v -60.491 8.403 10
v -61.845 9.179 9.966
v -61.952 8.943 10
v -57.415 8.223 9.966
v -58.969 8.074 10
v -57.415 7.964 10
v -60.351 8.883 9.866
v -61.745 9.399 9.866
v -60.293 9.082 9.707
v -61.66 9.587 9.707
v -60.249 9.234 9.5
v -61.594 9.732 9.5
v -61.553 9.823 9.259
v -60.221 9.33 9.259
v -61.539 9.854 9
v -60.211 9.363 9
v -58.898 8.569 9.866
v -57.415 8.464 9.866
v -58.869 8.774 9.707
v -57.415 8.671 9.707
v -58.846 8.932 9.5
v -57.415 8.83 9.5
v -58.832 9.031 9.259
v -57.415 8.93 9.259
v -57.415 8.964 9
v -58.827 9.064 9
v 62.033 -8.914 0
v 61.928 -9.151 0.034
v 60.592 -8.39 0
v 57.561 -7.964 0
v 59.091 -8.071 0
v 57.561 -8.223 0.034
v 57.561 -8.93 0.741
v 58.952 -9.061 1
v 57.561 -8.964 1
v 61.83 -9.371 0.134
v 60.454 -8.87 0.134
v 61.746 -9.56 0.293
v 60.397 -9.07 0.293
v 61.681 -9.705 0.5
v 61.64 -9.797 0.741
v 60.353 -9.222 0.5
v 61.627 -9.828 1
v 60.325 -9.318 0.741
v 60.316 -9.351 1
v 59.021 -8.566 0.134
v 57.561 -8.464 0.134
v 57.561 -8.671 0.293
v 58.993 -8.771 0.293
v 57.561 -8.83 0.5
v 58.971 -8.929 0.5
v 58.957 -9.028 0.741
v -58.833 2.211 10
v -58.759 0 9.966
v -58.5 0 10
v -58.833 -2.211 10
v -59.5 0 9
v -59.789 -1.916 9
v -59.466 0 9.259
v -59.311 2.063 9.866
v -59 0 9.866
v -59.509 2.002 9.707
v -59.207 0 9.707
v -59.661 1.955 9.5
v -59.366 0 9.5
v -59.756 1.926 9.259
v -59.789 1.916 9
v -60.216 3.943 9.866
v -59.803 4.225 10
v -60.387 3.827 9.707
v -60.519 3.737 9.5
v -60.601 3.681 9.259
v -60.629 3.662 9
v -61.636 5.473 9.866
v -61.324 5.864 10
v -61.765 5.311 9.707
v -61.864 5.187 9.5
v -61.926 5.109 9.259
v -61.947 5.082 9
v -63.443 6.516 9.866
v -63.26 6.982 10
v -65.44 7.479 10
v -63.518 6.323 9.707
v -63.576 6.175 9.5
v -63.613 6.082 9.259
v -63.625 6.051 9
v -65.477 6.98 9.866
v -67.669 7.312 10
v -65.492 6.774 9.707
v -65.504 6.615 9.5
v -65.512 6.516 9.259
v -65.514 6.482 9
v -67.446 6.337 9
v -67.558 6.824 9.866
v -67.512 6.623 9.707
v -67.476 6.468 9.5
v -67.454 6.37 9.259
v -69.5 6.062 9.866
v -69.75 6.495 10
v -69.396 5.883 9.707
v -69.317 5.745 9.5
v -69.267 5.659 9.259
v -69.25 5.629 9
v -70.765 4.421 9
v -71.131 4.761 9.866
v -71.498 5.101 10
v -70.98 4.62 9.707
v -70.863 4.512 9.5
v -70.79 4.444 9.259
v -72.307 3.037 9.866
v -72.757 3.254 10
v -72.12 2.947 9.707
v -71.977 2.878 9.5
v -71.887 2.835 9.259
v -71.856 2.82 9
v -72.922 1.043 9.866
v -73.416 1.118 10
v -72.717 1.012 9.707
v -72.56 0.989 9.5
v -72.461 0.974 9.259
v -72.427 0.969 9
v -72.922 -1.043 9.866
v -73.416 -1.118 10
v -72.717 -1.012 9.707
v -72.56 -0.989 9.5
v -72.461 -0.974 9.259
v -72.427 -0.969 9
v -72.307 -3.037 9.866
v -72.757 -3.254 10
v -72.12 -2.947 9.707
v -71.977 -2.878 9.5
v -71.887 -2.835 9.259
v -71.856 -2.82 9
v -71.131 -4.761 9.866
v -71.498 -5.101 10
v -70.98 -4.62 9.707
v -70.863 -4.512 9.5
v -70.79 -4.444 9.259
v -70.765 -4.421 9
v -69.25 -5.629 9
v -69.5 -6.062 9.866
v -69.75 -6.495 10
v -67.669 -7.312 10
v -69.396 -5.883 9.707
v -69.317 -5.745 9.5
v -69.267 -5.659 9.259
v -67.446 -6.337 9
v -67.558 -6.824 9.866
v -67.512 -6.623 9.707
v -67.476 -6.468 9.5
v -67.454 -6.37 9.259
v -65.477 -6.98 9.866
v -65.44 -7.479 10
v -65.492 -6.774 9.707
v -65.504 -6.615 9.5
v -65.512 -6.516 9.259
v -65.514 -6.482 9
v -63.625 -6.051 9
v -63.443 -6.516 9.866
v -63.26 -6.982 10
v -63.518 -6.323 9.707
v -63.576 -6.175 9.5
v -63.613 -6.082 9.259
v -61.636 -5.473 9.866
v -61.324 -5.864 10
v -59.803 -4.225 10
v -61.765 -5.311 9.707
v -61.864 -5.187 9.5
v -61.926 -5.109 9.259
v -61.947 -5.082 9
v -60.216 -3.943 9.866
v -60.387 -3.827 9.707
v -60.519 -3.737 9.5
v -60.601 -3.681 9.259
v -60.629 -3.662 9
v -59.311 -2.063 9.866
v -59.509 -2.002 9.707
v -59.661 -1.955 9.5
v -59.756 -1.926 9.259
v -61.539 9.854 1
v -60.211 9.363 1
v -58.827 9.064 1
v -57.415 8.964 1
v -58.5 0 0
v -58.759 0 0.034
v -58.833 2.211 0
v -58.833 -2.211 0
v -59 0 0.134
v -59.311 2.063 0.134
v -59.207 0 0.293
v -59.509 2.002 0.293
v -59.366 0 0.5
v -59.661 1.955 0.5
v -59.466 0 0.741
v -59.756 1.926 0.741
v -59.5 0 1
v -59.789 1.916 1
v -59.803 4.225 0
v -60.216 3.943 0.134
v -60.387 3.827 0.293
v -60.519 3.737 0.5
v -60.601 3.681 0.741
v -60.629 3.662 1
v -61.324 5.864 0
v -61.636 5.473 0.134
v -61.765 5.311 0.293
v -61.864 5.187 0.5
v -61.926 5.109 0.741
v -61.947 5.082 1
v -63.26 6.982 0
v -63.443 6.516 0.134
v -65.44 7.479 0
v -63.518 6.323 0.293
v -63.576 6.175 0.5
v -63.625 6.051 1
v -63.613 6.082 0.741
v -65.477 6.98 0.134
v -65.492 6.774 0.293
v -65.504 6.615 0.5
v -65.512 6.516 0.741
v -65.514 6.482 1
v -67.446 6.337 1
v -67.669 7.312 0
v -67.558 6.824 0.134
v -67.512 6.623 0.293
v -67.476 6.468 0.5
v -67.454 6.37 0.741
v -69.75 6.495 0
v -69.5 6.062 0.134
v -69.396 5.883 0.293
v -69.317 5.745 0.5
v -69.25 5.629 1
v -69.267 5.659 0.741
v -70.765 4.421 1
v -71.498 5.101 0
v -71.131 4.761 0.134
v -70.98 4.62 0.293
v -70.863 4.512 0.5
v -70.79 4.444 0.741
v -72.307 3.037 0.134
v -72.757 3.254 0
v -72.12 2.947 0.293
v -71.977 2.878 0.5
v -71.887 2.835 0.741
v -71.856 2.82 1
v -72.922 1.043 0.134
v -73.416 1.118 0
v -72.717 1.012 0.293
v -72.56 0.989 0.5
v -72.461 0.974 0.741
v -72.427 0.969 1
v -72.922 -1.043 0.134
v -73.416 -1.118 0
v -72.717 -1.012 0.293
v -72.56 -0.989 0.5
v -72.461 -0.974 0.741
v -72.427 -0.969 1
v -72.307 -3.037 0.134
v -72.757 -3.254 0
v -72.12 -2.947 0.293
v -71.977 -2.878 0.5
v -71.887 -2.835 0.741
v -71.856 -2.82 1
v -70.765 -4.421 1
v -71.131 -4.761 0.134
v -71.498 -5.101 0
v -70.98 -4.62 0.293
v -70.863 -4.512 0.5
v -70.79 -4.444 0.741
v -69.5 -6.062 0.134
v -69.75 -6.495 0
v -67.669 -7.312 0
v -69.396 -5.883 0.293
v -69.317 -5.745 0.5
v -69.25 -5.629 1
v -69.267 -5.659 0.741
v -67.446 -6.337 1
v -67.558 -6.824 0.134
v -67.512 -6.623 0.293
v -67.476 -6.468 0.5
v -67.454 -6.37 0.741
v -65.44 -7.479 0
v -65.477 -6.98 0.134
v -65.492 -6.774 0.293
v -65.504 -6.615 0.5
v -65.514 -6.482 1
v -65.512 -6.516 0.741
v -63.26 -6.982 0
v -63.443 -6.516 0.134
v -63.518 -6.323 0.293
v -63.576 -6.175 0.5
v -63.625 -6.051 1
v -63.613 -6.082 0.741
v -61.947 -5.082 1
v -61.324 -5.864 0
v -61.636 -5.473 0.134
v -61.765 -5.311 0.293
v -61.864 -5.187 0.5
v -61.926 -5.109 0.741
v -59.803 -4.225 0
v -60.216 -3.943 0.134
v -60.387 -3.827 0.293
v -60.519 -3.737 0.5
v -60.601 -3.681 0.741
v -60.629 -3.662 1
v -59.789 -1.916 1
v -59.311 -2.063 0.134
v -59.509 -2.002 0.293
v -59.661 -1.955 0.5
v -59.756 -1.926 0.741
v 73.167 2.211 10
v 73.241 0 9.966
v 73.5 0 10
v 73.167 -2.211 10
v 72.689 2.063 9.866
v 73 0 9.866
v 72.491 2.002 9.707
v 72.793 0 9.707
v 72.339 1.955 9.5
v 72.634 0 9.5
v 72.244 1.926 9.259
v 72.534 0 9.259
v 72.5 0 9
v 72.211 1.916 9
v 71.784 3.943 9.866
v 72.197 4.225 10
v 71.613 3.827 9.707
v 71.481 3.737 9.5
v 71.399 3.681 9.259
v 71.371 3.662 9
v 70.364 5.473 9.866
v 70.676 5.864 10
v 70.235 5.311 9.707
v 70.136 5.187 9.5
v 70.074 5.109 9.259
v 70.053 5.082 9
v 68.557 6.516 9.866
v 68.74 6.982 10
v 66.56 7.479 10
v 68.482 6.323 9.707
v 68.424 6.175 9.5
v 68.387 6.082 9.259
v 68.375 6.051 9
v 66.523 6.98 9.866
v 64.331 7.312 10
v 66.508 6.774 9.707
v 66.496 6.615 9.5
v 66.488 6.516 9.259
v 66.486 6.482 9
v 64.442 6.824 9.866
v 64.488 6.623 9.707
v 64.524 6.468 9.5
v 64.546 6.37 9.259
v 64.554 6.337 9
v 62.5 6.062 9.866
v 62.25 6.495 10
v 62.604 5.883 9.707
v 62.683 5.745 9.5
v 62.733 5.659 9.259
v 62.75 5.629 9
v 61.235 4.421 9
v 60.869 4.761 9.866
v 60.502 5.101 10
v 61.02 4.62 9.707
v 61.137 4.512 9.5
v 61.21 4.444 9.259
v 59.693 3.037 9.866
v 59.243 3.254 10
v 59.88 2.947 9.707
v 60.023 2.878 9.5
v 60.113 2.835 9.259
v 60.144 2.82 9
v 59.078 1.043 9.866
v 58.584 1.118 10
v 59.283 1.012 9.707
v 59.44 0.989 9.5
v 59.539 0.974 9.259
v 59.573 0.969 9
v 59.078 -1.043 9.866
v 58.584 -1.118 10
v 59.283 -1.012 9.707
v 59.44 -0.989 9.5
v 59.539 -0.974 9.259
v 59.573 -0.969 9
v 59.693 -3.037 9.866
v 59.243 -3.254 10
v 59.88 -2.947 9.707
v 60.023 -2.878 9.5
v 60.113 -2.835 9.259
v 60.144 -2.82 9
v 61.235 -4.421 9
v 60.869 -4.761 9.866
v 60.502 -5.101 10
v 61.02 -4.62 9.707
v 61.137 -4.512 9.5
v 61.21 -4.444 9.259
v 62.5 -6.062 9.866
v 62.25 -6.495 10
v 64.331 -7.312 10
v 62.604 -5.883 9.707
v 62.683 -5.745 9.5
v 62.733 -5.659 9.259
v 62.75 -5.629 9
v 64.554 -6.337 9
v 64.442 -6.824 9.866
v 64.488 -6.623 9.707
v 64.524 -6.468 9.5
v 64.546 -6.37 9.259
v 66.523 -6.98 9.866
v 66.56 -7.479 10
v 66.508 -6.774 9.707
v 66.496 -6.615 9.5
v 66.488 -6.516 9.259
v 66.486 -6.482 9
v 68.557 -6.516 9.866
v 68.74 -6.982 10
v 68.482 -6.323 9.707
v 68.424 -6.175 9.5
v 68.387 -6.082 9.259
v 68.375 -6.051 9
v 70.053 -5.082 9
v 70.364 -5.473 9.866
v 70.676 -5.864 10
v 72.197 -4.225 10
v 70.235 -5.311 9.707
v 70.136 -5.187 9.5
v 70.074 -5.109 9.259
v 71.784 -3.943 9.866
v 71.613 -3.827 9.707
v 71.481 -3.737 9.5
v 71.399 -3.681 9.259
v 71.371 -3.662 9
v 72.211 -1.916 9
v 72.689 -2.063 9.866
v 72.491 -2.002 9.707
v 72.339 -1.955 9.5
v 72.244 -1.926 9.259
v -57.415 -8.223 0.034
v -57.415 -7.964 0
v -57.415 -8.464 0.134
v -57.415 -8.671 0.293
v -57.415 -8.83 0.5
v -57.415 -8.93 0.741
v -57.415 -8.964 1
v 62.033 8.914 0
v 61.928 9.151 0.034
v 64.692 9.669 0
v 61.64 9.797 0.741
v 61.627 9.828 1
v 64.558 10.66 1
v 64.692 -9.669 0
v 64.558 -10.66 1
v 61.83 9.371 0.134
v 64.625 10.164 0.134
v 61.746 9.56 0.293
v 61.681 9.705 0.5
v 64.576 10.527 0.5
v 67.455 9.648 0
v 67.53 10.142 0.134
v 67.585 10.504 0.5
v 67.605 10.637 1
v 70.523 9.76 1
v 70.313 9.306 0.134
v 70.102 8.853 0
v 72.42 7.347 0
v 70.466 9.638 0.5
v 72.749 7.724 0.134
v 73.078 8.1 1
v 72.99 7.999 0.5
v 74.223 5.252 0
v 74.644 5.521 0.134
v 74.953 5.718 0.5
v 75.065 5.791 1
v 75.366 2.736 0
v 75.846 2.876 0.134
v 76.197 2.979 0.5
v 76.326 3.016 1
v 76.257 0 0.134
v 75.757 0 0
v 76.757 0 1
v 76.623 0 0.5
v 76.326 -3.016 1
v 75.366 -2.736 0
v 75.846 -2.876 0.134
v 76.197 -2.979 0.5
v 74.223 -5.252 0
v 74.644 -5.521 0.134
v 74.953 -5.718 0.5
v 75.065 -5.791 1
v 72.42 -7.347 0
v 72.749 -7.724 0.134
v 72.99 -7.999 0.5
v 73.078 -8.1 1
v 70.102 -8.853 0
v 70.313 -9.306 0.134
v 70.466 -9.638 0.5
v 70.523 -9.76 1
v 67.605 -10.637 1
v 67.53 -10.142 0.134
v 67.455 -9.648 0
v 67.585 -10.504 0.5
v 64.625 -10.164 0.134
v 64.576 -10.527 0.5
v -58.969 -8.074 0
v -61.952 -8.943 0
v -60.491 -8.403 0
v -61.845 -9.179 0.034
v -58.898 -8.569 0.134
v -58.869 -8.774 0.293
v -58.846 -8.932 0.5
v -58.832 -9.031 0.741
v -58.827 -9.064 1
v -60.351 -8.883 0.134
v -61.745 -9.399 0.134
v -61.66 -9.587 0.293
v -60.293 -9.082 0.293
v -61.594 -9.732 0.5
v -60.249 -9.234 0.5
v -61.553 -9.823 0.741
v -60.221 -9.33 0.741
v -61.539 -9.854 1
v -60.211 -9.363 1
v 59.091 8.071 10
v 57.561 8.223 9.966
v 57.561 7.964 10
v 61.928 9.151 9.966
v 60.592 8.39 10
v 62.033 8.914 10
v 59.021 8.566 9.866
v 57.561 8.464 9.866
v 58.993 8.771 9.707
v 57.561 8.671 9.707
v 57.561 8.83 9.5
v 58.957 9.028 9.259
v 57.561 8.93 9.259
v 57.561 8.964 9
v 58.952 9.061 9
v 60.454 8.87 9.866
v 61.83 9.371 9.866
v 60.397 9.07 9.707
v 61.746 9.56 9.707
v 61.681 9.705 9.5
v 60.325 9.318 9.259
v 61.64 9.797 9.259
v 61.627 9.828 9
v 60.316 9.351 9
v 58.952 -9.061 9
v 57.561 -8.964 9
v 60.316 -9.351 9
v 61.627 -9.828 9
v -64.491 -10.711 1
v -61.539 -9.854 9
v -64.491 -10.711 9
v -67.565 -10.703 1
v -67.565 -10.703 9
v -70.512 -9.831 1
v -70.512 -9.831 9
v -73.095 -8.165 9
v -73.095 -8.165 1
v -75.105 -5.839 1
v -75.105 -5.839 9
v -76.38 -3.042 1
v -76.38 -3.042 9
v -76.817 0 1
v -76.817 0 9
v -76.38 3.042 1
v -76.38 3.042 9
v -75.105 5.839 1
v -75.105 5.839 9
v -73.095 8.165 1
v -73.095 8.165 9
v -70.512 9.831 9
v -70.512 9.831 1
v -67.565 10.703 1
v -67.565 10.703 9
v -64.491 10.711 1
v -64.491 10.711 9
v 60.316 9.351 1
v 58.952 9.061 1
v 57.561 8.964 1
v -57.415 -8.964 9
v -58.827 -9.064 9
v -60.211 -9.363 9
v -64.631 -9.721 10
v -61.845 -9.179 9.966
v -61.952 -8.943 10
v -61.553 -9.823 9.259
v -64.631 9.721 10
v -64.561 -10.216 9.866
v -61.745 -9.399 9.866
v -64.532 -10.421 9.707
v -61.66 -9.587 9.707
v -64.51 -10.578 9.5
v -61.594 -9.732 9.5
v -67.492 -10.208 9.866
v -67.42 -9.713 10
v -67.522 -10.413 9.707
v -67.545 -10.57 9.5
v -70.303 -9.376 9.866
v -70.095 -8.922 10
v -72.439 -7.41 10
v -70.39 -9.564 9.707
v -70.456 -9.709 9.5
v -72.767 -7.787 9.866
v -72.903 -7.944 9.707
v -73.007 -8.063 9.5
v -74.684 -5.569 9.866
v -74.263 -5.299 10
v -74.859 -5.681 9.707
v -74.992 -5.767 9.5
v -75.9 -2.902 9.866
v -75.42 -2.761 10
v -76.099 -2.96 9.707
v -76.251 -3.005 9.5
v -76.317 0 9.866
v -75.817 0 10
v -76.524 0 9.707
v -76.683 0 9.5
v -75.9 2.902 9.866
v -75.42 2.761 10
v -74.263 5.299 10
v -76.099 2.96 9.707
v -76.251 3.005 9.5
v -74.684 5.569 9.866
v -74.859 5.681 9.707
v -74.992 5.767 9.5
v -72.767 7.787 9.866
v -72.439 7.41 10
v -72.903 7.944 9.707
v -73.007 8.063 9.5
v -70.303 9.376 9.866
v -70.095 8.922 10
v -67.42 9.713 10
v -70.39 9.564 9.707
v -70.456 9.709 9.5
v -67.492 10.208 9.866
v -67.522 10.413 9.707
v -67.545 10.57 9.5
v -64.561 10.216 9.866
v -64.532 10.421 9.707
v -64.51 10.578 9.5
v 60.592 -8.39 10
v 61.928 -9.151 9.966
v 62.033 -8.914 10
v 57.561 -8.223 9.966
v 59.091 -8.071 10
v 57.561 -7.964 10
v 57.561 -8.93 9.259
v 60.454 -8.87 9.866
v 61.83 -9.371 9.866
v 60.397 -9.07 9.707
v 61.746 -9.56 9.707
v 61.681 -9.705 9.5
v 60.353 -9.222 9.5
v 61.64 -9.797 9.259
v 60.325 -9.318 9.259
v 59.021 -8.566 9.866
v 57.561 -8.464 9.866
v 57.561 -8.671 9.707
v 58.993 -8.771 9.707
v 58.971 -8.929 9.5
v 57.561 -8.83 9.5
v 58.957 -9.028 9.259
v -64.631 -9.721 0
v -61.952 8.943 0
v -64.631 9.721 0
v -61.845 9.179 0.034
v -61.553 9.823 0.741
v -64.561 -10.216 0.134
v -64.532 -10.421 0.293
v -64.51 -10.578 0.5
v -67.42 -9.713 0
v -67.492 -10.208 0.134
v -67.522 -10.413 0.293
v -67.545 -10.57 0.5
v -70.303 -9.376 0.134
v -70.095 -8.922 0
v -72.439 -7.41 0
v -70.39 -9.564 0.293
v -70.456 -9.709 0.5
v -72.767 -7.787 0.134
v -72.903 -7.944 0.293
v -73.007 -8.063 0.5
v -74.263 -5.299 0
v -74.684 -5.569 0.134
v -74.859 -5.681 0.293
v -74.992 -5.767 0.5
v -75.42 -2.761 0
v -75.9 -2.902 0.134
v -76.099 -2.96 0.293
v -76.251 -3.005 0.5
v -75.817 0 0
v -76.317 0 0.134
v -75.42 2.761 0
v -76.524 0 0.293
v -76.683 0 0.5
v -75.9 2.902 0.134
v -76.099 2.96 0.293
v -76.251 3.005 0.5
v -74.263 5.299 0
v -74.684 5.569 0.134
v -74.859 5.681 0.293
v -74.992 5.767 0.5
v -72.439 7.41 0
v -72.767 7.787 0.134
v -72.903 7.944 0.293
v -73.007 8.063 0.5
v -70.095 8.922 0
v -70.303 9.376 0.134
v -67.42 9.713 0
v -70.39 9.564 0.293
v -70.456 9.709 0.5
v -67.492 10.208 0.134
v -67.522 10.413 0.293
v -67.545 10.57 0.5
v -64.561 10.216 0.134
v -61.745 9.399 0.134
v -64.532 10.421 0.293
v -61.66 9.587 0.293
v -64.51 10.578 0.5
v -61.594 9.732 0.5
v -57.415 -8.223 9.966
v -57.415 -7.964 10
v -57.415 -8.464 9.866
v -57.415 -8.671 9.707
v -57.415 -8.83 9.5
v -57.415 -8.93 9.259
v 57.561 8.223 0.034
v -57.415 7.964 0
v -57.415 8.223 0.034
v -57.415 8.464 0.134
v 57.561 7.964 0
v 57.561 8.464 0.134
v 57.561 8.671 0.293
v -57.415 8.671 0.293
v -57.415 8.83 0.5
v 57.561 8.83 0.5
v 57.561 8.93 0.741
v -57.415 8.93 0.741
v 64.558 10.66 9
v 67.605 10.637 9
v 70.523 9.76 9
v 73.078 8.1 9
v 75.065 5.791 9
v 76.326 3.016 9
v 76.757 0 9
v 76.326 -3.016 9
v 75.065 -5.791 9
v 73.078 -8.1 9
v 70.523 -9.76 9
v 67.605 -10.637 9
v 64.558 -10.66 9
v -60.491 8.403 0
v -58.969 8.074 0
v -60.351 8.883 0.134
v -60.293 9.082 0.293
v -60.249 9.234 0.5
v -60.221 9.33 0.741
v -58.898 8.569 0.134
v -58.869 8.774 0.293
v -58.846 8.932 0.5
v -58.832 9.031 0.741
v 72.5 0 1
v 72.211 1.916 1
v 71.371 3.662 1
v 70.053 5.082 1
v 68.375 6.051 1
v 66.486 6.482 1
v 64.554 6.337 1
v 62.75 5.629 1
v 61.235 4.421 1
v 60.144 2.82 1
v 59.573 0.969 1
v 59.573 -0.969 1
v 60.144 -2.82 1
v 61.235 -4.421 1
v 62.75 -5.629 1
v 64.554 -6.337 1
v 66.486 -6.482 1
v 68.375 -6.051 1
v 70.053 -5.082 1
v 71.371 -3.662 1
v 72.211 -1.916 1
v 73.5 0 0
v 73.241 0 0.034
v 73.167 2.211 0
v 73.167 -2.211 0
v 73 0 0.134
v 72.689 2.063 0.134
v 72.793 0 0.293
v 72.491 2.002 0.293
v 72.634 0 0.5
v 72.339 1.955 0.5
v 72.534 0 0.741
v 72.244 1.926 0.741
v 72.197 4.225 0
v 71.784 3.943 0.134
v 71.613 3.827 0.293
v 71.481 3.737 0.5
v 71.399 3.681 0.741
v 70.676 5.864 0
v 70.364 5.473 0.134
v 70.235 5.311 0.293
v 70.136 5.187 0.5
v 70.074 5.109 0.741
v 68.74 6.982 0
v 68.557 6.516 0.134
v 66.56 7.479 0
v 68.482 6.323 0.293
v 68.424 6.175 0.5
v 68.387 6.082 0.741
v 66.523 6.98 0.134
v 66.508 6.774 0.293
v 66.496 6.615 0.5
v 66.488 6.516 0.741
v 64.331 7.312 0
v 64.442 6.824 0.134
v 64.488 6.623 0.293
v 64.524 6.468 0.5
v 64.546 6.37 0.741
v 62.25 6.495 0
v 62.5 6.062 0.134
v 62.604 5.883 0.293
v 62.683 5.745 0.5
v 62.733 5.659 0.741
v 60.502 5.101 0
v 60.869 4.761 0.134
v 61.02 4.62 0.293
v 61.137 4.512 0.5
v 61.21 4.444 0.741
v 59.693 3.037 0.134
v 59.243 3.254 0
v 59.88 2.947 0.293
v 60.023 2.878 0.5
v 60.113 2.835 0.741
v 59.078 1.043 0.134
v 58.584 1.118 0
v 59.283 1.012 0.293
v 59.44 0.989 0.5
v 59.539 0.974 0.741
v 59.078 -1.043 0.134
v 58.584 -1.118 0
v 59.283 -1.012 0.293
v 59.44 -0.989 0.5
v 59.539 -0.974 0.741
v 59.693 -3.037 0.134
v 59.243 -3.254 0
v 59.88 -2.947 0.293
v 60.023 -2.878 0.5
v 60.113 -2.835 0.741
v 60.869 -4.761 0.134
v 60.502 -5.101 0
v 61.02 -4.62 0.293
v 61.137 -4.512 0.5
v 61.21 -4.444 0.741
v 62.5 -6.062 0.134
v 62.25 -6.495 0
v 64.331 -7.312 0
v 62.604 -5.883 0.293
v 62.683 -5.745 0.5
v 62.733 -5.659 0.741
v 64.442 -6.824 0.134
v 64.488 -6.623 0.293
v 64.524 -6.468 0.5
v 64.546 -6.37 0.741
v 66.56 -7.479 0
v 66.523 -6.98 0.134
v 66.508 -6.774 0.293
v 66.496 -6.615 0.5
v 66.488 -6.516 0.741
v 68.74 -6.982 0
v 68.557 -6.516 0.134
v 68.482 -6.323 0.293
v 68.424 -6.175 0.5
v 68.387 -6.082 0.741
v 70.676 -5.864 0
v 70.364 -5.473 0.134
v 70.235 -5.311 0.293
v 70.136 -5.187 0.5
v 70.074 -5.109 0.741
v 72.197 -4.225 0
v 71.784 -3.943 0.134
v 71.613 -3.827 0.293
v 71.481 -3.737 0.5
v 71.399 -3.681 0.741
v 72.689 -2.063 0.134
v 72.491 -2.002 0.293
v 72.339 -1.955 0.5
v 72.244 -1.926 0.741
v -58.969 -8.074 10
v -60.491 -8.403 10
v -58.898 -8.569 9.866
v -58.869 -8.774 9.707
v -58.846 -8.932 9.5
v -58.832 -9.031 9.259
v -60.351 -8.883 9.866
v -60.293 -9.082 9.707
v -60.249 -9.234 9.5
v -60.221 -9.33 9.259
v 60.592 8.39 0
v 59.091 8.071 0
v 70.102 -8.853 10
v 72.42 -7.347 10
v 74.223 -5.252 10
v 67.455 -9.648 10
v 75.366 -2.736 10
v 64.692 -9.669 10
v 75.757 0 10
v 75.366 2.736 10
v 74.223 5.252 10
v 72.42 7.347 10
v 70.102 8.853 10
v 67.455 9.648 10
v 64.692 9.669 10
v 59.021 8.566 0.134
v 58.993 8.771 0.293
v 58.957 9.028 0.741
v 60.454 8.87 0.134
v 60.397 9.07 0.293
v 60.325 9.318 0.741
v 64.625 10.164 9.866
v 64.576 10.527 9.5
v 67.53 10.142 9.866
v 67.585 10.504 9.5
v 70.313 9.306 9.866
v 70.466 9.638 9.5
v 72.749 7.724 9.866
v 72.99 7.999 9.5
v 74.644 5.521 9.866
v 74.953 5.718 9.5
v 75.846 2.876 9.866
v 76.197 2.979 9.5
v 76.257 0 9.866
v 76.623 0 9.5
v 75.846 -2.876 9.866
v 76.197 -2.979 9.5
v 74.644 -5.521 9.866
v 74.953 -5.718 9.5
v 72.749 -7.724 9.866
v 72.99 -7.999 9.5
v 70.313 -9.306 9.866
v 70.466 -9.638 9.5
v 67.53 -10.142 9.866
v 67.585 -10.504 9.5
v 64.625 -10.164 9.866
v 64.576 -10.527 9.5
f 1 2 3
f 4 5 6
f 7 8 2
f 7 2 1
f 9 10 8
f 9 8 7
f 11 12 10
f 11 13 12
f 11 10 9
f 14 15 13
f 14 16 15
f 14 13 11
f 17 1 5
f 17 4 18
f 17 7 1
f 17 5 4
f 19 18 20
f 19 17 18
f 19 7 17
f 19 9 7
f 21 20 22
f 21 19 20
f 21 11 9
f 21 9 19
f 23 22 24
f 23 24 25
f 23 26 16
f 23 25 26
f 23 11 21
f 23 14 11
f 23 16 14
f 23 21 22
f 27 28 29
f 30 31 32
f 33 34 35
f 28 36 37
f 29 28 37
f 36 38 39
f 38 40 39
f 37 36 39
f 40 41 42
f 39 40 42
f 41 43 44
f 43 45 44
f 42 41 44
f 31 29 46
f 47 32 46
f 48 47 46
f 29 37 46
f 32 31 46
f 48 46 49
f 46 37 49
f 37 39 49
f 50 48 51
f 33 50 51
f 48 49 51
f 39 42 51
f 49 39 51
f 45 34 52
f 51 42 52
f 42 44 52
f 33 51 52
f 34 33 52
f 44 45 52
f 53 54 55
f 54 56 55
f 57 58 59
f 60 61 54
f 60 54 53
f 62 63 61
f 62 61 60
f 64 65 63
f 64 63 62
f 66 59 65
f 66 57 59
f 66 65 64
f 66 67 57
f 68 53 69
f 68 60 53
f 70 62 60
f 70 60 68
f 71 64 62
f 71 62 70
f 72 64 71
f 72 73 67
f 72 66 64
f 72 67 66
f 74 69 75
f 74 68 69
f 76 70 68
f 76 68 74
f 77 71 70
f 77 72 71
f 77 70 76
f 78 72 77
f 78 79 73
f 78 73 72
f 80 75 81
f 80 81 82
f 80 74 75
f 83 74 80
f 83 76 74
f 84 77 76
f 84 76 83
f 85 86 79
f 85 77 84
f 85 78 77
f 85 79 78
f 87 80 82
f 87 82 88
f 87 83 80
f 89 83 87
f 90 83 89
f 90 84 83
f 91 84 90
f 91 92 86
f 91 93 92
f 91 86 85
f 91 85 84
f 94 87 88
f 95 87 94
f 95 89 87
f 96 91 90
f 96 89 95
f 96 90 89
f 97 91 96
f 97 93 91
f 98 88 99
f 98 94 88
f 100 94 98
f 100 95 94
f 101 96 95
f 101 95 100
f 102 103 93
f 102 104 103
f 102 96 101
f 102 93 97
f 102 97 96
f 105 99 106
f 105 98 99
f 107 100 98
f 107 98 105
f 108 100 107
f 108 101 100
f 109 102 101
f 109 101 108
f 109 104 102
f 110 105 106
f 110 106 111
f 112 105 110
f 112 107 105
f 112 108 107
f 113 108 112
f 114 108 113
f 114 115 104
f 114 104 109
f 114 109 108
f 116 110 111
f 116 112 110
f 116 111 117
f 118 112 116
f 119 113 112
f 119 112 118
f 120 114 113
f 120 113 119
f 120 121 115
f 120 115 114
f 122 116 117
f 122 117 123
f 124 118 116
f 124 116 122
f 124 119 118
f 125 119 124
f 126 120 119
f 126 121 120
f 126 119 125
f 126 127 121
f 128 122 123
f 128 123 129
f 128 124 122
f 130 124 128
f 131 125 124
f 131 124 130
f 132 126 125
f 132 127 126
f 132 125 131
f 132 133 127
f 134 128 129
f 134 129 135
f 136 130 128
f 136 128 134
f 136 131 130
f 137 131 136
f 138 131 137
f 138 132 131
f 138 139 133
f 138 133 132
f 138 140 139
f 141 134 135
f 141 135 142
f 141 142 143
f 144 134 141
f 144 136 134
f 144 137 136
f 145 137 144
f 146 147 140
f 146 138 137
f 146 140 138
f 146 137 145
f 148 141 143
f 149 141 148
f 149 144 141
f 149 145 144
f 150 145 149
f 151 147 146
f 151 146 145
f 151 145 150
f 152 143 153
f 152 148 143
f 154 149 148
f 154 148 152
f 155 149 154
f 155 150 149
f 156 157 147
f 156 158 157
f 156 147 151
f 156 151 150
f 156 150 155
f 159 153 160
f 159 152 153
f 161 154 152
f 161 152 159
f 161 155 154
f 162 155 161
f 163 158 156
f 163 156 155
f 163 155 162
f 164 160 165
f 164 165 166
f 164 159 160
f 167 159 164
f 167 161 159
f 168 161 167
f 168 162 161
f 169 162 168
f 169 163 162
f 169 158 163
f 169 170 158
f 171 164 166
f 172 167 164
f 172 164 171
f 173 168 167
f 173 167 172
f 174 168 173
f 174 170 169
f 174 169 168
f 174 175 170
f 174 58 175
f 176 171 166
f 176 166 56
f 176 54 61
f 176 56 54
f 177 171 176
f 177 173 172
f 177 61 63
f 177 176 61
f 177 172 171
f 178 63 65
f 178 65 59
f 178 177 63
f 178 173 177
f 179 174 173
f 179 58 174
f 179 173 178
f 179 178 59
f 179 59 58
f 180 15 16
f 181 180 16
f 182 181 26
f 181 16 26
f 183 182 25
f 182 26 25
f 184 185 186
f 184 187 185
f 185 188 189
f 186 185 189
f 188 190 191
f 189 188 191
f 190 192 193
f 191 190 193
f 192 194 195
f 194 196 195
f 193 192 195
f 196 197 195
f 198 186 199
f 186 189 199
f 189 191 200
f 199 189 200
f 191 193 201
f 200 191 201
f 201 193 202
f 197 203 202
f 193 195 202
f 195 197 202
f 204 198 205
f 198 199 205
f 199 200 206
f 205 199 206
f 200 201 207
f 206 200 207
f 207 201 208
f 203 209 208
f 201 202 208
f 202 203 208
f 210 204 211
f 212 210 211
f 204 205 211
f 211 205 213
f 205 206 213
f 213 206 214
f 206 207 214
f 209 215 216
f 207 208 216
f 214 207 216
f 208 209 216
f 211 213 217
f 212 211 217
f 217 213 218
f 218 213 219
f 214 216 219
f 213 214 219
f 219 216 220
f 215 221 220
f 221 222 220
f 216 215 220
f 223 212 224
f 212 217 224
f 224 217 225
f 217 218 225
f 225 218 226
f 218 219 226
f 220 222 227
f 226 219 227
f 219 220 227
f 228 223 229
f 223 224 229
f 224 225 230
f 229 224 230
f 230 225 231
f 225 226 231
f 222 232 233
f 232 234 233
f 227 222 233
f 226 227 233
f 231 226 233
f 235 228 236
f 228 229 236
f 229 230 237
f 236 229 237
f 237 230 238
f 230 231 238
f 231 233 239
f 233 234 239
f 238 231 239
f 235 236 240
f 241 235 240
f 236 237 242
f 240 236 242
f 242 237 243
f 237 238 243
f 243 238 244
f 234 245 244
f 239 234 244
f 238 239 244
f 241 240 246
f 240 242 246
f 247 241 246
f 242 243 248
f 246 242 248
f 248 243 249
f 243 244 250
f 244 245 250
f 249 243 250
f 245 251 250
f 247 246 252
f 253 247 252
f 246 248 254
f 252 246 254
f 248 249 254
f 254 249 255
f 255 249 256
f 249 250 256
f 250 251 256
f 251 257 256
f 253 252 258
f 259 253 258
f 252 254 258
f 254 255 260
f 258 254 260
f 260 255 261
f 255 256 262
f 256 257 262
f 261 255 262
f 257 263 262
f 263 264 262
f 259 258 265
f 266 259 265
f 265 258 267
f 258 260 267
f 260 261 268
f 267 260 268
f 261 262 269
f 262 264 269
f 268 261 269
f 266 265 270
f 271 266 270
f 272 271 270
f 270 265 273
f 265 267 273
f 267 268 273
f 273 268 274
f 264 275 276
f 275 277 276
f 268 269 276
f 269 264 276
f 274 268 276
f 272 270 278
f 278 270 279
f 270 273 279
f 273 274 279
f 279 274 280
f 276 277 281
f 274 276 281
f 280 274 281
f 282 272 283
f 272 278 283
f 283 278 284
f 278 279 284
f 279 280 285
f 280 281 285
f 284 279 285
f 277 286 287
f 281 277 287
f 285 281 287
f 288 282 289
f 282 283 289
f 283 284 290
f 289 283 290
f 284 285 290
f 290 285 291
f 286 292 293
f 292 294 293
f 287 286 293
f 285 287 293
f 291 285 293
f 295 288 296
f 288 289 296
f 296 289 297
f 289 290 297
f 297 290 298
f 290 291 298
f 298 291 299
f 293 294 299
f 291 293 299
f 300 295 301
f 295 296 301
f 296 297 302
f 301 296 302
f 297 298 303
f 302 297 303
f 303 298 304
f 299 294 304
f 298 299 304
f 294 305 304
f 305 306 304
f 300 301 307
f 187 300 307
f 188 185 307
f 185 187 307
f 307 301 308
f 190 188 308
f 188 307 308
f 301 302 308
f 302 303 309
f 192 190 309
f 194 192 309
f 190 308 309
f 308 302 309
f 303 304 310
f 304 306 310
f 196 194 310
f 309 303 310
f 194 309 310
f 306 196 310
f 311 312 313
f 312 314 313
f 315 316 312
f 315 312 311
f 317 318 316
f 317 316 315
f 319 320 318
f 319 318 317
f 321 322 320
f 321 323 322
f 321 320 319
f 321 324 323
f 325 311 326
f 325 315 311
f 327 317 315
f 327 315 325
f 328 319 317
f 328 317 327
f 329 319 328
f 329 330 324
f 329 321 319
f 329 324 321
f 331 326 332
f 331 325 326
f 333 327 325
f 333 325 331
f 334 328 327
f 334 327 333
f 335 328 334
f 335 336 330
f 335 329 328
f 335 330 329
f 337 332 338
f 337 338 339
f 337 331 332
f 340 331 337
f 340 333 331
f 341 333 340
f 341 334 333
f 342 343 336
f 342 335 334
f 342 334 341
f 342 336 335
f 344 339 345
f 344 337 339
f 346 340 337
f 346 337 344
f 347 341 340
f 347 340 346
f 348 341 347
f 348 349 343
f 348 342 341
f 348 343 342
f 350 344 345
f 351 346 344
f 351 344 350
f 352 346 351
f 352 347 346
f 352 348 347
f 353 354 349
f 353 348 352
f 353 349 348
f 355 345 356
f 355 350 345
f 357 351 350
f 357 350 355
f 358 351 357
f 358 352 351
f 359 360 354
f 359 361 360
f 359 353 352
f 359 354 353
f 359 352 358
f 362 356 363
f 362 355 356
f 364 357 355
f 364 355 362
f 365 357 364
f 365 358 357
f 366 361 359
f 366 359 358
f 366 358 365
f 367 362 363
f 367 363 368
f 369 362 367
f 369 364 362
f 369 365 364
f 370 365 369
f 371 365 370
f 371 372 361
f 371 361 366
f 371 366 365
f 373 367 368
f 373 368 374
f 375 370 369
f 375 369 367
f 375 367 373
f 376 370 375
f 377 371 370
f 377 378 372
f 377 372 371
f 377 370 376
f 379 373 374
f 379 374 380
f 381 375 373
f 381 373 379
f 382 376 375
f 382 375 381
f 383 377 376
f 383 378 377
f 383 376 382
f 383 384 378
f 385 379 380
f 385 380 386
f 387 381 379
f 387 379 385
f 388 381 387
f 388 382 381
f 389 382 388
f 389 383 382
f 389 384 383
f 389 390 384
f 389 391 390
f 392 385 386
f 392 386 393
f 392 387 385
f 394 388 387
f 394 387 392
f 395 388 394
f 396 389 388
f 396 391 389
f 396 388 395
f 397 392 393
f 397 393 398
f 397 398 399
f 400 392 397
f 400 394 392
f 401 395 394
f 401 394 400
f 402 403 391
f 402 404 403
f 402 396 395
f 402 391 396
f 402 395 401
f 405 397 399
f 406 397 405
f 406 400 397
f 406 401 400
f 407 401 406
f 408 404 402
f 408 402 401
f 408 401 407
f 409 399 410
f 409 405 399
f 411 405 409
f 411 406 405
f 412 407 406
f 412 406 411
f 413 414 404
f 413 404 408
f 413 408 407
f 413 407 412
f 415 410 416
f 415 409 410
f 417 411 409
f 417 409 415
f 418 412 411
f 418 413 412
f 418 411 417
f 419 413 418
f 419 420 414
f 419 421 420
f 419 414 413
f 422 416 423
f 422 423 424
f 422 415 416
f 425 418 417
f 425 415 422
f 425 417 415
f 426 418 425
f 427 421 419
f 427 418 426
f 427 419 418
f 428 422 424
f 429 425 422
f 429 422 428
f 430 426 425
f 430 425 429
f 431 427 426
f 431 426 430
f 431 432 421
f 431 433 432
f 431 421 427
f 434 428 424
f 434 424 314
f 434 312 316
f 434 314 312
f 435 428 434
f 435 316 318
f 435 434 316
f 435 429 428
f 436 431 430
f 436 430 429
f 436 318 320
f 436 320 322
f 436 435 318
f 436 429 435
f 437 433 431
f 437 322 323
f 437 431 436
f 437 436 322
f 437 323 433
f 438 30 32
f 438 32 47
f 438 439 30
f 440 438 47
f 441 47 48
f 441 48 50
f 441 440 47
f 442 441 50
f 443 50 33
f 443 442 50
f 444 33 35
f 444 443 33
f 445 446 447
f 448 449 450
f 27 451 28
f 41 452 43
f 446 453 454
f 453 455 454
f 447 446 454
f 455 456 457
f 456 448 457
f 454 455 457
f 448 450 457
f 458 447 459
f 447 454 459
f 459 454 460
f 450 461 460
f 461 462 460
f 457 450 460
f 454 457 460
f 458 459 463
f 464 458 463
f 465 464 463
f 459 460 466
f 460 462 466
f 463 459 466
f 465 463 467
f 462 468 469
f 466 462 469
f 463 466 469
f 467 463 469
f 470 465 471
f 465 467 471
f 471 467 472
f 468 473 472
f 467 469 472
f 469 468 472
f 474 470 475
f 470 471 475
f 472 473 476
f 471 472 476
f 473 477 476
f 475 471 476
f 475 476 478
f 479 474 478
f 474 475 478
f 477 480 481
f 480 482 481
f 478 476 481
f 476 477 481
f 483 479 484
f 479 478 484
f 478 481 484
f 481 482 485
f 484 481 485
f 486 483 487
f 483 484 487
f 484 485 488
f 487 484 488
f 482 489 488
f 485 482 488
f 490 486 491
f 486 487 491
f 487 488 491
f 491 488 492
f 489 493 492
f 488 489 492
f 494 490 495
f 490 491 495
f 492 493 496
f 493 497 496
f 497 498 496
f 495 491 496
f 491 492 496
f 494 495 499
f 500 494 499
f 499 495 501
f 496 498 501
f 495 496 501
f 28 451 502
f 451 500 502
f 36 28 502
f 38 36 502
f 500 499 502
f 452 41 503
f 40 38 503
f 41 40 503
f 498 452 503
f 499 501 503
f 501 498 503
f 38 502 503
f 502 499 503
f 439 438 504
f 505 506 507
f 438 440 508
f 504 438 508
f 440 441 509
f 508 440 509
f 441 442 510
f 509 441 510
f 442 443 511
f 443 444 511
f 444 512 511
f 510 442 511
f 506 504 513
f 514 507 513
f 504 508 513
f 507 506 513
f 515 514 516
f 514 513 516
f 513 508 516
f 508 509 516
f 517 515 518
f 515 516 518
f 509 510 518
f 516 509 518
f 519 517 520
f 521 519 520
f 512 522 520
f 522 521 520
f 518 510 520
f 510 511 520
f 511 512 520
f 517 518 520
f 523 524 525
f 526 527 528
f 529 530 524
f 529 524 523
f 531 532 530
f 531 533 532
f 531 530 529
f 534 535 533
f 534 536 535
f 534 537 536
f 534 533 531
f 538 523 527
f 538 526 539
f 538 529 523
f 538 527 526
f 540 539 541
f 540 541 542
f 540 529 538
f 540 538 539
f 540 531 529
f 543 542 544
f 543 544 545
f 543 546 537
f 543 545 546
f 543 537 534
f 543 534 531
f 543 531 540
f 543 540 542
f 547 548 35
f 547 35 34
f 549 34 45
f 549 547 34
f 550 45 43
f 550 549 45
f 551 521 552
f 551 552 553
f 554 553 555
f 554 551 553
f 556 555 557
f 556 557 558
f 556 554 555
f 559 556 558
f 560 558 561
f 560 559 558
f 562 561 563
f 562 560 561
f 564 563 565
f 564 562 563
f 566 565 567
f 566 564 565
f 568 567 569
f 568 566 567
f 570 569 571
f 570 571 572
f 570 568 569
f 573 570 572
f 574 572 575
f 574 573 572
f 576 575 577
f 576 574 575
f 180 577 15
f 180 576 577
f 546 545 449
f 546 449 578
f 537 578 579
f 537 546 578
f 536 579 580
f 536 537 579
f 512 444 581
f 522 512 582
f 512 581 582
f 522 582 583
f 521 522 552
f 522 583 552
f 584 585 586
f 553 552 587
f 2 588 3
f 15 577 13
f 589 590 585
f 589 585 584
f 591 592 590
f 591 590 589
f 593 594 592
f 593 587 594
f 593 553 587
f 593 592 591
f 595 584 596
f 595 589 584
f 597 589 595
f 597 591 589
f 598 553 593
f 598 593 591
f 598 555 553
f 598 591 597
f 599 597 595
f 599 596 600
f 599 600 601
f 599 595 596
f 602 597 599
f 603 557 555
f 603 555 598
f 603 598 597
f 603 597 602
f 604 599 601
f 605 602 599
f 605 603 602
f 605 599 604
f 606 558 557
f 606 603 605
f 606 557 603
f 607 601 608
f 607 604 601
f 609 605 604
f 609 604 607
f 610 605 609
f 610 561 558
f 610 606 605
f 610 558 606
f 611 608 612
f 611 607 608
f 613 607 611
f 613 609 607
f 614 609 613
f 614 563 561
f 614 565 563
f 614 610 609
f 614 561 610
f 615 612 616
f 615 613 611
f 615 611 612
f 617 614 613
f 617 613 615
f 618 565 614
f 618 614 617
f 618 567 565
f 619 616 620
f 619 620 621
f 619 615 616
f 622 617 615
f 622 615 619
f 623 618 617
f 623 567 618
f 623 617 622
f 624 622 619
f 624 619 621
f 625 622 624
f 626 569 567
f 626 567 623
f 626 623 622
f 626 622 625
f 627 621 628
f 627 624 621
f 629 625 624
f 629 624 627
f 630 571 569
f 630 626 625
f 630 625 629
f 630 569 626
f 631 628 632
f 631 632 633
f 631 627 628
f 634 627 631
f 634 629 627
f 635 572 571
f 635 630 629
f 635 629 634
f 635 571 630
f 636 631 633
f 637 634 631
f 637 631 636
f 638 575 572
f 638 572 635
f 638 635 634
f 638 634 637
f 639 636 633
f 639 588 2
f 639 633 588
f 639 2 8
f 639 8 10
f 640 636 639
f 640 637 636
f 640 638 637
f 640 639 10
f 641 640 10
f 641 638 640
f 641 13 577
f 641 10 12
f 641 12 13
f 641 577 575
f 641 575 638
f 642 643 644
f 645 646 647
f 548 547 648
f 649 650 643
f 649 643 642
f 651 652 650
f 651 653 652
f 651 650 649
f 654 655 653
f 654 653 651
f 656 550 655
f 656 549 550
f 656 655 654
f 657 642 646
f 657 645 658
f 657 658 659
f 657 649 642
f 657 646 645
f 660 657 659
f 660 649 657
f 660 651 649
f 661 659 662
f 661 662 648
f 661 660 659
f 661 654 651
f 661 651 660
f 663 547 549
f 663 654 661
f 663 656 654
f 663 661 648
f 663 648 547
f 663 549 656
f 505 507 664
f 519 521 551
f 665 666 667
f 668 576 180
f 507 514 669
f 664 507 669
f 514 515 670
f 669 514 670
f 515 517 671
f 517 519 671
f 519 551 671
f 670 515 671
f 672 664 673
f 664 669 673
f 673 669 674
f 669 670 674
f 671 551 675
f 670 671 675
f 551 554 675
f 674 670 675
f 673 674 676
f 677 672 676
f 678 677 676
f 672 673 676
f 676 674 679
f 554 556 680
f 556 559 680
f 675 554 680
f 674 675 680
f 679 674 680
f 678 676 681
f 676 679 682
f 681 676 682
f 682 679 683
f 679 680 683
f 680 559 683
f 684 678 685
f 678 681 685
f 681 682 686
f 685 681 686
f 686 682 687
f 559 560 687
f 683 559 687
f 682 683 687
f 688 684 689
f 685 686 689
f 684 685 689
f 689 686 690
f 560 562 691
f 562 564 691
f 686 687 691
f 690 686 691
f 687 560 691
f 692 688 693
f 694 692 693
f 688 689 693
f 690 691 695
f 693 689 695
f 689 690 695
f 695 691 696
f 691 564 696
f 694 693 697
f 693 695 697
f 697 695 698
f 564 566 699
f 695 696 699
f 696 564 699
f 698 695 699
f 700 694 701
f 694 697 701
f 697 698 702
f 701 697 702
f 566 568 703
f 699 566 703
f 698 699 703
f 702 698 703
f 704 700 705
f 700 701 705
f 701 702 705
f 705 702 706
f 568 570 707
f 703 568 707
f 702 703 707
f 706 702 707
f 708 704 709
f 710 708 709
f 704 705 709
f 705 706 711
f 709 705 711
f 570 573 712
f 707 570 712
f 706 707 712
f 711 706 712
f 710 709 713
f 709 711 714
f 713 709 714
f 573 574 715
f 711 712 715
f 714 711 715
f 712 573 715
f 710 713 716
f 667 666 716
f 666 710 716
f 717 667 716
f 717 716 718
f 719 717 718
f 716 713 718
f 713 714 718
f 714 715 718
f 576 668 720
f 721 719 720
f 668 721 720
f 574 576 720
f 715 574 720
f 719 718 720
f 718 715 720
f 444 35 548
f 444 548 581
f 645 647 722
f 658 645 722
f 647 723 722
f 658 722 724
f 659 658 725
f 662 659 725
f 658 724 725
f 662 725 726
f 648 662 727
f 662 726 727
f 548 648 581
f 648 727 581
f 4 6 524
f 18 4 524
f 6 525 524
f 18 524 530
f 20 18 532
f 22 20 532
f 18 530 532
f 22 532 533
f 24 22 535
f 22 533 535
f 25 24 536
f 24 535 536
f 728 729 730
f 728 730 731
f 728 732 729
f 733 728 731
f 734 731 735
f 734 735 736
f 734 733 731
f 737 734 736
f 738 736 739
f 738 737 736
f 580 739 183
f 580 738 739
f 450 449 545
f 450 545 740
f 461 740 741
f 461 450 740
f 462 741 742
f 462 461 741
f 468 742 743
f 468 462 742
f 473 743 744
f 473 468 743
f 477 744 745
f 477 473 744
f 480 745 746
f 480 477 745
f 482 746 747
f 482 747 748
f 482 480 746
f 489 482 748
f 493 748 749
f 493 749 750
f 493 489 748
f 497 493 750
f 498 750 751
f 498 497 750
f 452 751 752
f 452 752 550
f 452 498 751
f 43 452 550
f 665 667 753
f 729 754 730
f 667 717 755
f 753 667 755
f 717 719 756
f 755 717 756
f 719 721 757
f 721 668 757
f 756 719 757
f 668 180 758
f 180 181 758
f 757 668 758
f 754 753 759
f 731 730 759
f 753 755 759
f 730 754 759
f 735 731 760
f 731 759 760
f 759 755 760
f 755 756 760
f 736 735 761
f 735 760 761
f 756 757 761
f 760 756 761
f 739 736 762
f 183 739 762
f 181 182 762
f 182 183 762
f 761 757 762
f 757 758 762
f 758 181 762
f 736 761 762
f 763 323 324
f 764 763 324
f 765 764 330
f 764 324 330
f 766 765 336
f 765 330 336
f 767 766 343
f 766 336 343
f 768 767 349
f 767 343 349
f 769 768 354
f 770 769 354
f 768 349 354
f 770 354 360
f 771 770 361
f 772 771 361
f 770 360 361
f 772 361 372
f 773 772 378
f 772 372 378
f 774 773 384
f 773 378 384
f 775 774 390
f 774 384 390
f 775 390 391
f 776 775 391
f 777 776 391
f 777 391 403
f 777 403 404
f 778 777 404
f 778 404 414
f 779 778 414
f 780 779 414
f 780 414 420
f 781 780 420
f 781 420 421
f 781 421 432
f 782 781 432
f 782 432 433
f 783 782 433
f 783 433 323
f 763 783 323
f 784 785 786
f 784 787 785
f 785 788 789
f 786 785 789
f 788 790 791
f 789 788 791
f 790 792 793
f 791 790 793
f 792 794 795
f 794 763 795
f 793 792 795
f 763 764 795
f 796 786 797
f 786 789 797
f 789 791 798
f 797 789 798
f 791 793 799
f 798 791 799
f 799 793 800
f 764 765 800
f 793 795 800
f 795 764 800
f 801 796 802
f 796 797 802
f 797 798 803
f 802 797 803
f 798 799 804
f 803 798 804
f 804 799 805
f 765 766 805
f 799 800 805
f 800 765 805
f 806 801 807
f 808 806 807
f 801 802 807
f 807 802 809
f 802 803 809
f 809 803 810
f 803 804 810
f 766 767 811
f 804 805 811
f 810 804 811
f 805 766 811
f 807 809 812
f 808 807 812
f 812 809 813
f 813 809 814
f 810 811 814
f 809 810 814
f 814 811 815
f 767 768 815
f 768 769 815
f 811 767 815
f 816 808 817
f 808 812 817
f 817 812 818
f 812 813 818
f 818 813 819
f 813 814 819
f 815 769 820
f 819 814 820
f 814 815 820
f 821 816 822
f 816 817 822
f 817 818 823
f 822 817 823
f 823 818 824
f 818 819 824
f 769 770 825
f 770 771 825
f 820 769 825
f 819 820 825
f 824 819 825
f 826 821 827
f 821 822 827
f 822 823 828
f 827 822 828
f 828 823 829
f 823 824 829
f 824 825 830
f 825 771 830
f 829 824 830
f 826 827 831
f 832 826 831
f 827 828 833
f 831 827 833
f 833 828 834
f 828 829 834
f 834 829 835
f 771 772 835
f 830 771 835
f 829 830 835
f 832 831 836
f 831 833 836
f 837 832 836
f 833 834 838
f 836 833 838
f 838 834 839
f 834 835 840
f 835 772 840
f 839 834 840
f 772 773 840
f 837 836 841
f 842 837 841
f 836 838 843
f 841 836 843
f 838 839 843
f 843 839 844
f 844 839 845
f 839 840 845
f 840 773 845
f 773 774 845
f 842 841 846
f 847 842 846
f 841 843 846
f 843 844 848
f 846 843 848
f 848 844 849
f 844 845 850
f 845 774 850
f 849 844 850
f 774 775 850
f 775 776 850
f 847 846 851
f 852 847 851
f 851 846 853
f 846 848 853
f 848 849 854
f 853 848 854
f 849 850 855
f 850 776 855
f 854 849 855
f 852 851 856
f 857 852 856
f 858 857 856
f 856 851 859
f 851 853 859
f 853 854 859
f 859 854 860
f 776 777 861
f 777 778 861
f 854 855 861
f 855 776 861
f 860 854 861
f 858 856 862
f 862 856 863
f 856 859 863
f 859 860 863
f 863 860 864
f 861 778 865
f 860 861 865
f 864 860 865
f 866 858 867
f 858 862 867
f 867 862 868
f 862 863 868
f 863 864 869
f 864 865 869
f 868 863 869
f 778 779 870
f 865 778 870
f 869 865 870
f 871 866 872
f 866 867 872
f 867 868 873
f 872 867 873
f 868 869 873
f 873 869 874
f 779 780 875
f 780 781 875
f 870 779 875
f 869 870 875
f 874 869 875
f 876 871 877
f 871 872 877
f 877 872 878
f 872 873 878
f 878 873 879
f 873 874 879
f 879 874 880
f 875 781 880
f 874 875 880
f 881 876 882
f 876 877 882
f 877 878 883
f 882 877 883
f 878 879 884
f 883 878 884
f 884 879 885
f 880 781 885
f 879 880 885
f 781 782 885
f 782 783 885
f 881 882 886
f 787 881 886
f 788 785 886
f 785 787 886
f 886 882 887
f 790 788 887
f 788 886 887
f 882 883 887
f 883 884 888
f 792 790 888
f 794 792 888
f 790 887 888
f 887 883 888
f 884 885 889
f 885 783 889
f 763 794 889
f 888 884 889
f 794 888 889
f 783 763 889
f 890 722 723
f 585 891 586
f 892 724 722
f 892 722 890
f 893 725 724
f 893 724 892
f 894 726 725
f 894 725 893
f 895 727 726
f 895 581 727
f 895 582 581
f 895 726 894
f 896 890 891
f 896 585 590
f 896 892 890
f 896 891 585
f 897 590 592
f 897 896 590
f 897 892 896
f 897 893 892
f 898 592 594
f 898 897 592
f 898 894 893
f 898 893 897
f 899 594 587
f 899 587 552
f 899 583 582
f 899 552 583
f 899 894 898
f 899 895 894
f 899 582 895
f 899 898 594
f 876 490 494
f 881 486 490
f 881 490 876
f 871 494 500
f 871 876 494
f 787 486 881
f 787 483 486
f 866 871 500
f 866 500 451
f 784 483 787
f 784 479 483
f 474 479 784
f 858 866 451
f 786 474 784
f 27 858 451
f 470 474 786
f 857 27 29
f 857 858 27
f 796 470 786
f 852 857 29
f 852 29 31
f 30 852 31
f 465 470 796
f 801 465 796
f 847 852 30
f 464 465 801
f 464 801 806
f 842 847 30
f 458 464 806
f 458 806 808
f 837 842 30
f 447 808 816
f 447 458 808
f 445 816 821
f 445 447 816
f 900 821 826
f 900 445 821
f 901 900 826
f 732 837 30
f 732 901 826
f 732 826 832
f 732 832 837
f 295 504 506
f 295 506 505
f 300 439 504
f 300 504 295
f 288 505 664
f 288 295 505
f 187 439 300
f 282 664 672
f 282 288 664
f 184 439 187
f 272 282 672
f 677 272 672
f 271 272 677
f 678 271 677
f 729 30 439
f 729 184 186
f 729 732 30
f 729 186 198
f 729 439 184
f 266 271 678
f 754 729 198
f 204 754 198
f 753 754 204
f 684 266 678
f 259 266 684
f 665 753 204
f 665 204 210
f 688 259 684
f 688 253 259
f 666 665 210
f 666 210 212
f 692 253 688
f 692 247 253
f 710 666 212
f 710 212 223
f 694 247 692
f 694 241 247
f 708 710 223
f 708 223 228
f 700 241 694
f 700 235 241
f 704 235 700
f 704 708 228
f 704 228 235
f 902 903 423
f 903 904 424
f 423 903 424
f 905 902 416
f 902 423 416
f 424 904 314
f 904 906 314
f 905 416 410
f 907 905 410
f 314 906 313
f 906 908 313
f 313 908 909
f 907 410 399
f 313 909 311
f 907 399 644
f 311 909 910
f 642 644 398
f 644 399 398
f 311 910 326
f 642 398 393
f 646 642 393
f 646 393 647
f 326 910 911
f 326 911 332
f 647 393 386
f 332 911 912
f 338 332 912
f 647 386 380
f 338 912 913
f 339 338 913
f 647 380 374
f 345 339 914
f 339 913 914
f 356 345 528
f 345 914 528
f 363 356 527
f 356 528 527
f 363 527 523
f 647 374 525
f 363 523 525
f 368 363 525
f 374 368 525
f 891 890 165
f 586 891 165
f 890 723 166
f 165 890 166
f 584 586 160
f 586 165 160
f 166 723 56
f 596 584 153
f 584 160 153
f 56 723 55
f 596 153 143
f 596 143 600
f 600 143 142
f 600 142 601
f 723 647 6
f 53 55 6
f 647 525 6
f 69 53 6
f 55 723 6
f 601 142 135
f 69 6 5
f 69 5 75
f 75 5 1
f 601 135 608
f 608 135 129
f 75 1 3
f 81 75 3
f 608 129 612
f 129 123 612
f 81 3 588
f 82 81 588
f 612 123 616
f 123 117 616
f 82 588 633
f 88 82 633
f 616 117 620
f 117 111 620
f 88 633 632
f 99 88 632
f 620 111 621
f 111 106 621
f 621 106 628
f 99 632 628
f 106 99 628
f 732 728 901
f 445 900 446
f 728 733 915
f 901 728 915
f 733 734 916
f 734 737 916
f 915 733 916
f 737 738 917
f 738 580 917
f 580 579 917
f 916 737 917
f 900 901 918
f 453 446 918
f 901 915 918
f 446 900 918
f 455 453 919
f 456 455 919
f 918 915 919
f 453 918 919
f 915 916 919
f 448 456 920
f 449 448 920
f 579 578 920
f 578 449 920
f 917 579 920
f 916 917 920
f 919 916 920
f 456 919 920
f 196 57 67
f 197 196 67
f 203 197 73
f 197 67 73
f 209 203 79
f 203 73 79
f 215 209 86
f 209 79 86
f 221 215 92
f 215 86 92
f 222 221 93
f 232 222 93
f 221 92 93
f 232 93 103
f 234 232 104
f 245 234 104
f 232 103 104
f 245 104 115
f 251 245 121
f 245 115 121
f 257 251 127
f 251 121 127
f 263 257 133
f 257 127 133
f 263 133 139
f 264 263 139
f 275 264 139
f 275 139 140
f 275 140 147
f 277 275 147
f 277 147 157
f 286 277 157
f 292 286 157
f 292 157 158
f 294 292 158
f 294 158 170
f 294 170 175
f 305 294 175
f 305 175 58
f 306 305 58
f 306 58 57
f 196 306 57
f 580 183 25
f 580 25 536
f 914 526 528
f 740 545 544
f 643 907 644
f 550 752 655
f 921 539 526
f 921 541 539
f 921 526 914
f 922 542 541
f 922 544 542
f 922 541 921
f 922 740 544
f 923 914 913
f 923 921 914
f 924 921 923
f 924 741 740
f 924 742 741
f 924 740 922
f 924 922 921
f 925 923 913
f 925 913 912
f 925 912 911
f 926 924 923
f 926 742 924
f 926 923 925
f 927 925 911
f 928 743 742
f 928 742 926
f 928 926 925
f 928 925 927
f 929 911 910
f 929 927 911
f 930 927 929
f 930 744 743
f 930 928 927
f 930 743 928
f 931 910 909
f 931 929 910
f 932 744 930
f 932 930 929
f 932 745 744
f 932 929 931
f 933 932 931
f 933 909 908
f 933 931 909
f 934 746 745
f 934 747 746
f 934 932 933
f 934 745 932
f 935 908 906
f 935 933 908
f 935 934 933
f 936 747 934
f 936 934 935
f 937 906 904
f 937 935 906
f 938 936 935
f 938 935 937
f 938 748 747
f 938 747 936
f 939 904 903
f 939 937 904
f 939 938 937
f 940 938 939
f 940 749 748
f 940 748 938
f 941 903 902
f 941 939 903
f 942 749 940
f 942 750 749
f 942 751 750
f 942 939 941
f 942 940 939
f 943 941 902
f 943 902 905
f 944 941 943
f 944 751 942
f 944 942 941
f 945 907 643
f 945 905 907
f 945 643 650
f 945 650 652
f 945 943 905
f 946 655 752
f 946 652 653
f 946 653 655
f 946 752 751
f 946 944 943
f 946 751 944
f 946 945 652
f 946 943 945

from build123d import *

# Parameters (mm, degrees)
EXTRUDE_1_DEPTH     = 10
SKETCH_2_R          = 6.5
CUT_EXTRUDE_1_DEPTH = 79.216355739
FILLET_1_R          = 10
FILLET_2_R          = 1


with BuildPart() as part:
    # 草图1 → 凸台-拉伸1 (new body)
    with BuildSketch(Plane.XY):
        with BuildLine():
            Line((60.053581818, -8.964047477), (-59.946418182, -8.964047477))
            ThreePointArc((-59.946418182, -8.964047477), (-76.816653826, 0), (-59.946418182, 8.964047477))
            Line((-59.946418182, 8.964047477), (60.053581818, 8.964047477))
            ThreePointArc((60.053581818, 8.964047477), (76.757045894, 0), (60.053581818, -8.964047477))
        make_face()
    extrude(amount=EXTRUDE_1_DEPTH)

    # 草图2 → 切除-拉伸1 (cut, through all)
    with BuildSketch(Plane.XY.offset(10)):
        with Locations((-66, 0)):
            Circle(SKETCH_2_R)
        with Locations((66, 0)):
            Circle(SKETCH_2_R)
    extrude(amount=-CUT_EXTRUDE_1_DEPTH, mode=Mode.SUBTRACT)

    # 圆角1
    fillet_1_edges = [part.edges().sort_by_distance(p)[0] for p in [
        (60.053581818, -8.964047477, 5),
        (-59.946418182, -8.964047477, 5),
        (-59.946418182, 8.964047477, 5),
        (60.053581818, 8.964047477, 5),
    ]]
    fillet(fillet_1_edges, radius=FILLET_1_R)

    # 圆角2
    fillet_2_edges = [part.edges().sort_by_distance(p)[0] for p in [
        (59.5, 0, 0),
        (59.5, 0, 10),
        (-72.5, 0, 0),
        (-72.5, 0, 10),
        (76.757045894, 0, 0),
        (76.757045894, 0, 10),
        (0.072783459, -8.964047477, 0),
        (0.072783459, -8.964047477, 10),
        (-76.816653826, 0, 0),
        (-76.816653826, 0, 10),
        (0.072783459, 8.964047477, 0),
        (0.072783459, 8.964047477, 10),
        (59.639037336, -9.182381543, 0),
        (59.639037336, -9.182381543, 10),
        (-59.524706381, -9.189070129, 0),
        (-59.524706381, -9.189070129, 10),
        (59.639037336, 9.182381543, 0),
        (59.639037336, 9.182381543, 10),
        (-59.524706381, 9.189070129, 0),
        (-59.524706381, 9.189070129, 10),
    ]]
    fillet(fillet_2_edges, radius=FILLET_2_R)


solid = part.part
